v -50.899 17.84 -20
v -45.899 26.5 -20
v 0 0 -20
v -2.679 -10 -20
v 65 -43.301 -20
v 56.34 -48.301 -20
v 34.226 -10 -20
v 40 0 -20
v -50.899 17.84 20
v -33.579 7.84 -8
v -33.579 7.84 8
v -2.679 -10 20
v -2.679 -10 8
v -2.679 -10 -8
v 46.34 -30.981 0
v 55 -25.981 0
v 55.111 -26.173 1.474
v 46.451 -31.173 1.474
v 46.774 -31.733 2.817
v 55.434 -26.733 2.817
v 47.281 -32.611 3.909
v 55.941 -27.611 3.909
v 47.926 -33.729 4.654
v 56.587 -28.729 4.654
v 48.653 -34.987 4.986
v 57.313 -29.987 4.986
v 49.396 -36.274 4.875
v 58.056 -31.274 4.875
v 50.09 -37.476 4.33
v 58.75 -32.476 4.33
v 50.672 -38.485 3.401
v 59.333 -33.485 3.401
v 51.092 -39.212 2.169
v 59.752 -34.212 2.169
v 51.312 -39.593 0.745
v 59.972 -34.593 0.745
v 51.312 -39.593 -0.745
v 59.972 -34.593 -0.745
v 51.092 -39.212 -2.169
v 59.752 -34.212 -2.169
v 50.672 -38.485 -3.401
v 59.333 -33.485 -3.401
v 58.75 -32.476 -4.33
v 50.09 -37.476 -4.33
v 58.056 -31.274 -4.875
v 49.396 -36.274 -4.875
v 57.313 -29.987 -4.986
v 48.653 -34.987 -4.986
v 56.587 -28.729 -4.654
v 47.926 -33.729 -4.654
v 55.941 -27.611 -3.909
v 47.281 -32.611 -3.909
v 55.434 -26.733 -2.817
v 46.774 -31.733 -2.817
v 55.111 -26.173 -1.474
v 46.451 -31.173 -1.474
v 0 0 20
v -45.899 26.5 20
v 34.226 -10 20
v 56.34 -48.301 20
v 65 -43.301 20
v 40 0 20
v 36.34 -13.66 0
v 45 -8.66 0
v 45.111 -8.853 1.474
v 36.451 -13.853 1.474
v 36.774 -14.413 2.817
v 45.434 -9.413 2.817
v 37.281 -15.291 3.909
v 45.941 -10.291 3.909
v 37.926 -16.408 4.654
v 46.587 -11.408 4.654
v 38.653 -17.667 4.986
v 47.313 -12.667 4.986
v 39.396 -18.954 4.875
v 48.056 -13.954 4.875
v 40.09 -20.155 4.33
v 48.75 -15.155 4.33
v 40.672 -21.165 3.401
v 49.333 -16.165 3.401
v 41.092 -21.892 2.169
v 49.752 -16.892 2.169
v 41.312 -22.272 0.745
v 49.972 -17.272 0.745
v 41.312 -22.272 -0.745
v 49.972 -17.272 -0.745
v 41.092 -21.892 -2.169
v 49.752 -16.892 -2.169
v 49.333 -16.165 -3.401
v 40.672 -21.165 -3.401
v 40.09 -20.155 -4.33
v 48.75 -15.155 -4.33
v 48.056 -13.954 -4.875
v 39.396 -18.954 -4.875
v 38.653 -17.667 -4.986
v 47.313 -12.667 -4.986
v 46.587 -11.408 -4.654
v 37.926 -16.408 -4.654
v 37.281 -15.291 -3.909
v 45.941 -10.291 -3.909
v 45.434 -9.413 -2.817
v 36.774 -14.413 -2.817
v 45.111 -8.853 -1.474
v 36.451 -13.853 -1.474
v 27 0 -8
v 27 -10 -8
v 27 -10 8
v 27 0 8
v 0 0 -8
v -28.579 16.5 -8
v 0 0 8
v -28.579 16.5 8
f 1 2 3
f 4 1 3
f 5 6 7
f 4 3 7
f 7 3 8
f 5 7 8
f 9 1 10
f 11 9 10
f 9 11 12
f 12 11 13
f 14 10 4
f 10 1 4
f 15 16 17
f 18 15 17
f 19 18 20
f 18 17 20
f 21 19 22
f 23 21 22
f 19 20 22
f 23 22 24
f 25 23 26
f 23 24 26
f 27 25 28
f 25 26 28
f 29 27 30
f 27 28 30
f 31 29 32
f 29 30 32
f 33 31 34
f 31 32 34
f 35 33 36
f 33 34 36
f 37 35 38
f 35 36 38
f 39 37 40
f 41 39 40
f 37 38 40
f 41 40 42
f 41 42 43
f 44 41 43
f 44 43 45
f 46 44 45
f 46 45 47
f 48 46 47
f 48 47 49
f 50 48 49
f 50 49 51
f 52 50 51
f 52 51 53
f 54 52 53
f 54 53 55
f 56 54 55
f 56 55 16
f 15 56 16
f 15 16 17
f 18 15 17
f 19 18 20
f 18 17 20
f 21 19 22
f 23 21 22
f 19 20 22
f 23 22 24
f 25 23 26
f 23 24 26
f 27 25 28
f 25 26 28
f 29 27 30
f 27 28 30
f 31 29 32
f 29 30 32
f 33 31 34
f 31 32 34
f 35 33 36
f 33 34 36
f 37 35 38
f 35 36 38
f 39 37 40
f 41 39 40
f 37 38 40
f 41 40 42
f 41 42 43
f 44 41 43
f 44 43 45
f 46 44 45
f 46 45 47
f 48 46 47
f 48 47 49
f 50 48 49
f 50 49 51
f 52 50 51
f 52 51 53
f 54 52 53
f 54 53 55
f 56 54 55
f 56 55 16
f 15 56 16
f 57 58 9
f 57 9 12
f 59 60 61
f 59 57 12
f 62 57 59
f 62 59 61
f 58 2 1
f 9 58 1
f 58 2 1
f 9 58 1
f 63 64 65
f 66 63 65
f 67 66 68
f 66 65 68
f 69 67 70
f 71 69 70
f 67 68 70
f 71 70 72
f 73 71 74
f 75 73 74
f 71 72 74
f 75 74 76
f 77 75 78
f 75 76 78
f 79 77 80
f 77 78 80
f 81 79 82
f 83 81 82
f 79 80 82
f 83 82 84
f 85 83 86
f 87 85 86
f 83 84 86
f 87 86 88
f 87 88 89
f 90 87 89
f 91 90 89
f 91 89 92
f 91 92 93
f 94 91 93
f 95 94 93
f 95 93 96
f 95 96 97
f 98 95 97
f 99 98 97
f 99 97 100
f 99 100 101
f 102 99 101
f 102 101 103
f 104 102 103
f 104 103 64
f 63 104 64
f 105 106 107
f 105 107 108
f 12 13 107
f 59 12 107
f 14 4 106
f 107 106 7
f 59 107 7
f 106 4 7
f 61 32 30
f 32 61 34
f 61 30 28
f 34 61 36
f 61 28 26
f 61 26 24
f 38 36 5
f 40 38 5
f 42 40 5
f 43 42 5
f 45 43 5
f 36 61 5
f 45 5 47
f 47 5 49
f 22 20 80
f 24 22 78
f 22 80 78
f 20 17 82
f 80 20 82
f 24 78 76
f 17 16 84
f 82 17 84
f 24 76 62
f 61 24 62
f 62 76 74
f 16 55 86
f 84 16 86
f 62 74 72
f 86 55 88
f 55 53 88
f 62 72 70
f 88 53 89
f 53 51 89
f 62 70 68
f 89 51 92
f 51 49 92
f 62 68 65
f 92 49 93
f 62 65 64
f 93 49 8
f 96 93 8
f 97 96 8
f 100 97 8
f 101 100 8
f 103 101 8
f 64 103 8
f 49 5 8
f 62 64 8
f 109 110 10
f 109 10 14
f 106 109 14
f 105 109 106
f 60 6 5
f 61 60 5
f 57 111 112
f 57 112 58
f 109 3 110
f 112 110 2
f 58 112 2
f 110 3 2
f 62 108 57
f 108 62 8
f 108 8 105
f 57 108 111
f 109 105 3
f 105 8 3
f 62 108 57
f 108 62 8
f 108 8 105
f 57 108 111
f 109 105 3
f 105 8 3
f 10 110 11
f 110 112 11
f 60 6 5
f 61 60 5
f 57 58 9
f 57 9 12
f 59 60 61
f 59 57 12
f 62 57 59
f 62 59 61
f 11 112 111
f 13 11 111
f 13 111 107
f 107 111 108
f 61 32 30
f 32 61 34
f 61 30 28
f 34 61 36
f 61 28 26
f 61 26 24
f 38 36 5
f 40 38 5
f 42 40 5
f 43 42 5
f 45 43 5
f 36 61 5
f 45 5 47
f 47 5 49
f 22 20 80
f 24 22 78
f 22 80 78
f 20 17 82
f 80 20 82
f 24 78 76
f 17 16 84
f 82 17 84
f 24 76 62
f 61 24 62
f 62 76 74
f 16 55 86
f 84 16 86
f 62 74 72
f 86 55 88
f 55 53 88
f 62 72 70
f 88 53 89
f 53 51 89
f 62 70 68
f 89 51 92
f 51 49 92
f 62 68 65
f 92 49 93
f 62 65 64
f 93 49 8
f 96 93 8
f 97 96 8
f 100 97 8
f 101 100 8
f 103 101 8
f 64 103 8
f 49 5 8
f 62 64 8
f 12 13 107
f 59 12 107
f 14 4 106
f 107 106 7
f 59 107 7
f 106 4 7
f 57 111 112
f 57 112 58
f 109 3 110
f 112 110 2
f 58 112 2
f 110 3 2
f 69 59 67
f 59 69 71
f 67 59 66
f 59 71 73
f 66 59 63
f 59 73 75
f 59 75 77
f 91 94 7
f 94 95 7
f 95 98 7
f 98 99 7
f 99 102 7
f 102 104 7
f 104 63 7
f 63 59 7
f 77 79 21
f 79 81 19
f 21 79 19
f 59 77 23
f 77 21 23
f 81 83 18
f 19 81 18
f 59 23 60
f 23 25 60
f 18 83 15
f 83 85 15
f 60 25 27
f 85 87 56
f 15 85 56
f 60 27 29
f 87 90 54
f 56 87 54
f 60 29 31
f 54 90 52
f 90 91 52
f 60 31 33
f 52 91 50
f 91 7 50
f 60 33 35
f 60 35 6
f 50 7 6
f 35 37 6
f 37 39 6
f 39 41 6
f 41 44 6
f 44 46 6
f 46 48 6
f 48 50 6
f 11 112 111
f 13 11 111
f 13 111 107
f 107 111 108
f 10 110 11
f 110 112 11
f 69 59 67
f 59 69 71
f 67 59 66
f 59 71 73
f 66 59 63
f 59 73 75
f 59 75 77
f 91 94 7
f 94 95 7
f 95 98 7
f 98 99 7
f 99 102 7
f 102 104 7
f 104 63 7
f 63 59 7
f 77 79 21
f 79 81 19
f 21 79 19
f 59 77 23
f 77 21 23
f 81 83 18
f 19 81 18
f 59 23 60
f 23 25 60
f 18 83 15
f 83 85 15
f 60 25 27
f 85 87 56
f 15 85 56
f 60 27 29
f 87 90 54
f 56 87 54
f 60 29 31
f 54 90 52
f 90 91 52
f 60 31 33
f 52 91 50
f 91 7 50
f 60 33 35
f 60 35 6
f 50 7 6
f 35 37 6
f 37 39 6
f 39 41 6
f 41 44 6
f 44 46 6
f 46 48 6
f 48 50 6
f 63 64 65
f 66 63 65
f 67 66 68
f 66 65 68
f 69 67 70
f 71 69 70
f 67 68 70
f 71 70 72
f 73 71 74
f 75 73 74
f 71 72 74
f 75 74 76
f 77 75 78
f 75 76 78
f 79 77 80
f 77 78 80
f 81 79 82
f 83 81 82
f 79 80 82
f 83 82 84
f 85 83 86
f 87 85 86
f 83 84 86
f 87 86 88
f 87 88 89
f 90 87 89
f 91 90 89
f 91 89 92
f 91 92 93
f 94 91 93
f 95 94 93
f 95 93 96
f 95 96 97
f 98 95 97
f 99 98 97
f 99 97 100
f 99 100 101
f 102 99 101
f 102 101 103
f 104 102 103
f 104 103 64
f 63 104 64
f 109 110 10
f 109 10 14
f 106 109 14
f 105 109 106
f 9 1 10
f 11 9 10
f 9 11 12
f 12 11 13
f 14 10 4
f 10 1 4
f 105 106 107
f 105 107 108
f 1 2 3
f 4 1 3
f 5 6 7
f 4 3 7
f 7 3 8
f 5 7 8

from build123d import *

# Parameters (mm, degrees)
EXTRUDE_THIN1_START   = -20
EXTRUDE_THIN1_DEPTH   = 40
EXTRUDE_THIN1_2_DEPTH = 40
CUT_EXTRUDE1_DEPTH    = 8
SKETCH4_R             = 5
CUT_EXTRUDE2_DEPTH    = 107.070363583


# Read off the part's stored shape, not the designer's step: Extrude-Thin1
with BuildPart() as part:
    # Extrude-Thin1 outline → Extrude-Thin1 (new body)
    with BuildSketch(Plane.XY.offset(EXTRUDE_THIN1_START)):
        Polygon((0, 0), (-45.899346401, 26.5), (-50.899346401, 17.839745962), (-2.679491924, -10), (34.226497308, -10), (56.339745962, -48.301270189), (65, -43.301270189), (40, 0), align=None)
    extrude(amount=EXTRUDE_THIN1_DEPTH)


with BuildPart() as body_2:
    # Extrude-Thin1 2 outline → Extrude-Thin1 2 (new body)
    with BuildSketch(Plane.XY.offset(EXTRUDE_THIN1_START)):
        Polygon((-2.679491924, -10), (34.226497308, -10), (56.339745962, -48.301270189), (65, -43.301270189), (40, 0), (0, 0), (-45.899346401, 26.5), (-50.899346401, 17.839745962), align=None)
    extrude(amount=EXTRUDE_THIN1_2_DEPTH)


with BuildPart() as cut_extrude1_tool:
    # Sketch3 → Cut-Extrude1 (new, symmetric)
    with BuildSketch(Plane.XY):
        Polygon((-28.578838325, 16.5), (-33.578838325, 7.839745962), (-2.679491924, -10), (27, -10), (27, 0), (0, 0), align=None)
    extrude(amount=CUT_EXTRUDE1_DEPTH, both=True)


with BuildPart() as part_1:
    add(part.part)

    # Cut-Extrude1: cut by cut_extrude1_tool
    add(cut_extrude1_tool.part, mode=Mode.SUBTRACT)


with BuildPart() as body_2_1:
    add(body_2.part)

    # Cut-Extrude1: cut by cut_extrude1_tool
    add(cut_extrude1_tool.part, mode=Mode.SUBTRACT)


with BuildPart() as cut_extrude2_tool:
    # Sketch4 → Cut-Extrude2 (new, through all)
    with BuildSketch(Plane(origin=(30, 17.320508076, 0), x_dir=(0, 0, -1), z_dir=(0.8660254037844378, 0.5000000000000016, 0))):
        with Locations(Location((0, -35, 0), (0, 0, 90))):
            Circle(SKETCH4_R)
        with Locations(Location((0, -55, 0), (0, 0, 90))):
            Circle(SKETCH4_R)
    extrude(amount=-CUT_EXTRUDE2_DEPTH)


with BuildPart() as part_2:
    add(part_1.part)

    # Cut-Extrude2: cut by cut_extrude2_tool
    add(cut_extrude2_tool.part, mode=Mode.SUBTRACT)


with BuildPart() as body_2_2:
    add(body_2_1.part)

    # Cut-Extrude2: cut by cut_extrude2_tool
    add(cut_extrude2_tool.part, mode=Mode.SUBTRACT)


solid = Compound([part_2.part, body_2_2.part])
